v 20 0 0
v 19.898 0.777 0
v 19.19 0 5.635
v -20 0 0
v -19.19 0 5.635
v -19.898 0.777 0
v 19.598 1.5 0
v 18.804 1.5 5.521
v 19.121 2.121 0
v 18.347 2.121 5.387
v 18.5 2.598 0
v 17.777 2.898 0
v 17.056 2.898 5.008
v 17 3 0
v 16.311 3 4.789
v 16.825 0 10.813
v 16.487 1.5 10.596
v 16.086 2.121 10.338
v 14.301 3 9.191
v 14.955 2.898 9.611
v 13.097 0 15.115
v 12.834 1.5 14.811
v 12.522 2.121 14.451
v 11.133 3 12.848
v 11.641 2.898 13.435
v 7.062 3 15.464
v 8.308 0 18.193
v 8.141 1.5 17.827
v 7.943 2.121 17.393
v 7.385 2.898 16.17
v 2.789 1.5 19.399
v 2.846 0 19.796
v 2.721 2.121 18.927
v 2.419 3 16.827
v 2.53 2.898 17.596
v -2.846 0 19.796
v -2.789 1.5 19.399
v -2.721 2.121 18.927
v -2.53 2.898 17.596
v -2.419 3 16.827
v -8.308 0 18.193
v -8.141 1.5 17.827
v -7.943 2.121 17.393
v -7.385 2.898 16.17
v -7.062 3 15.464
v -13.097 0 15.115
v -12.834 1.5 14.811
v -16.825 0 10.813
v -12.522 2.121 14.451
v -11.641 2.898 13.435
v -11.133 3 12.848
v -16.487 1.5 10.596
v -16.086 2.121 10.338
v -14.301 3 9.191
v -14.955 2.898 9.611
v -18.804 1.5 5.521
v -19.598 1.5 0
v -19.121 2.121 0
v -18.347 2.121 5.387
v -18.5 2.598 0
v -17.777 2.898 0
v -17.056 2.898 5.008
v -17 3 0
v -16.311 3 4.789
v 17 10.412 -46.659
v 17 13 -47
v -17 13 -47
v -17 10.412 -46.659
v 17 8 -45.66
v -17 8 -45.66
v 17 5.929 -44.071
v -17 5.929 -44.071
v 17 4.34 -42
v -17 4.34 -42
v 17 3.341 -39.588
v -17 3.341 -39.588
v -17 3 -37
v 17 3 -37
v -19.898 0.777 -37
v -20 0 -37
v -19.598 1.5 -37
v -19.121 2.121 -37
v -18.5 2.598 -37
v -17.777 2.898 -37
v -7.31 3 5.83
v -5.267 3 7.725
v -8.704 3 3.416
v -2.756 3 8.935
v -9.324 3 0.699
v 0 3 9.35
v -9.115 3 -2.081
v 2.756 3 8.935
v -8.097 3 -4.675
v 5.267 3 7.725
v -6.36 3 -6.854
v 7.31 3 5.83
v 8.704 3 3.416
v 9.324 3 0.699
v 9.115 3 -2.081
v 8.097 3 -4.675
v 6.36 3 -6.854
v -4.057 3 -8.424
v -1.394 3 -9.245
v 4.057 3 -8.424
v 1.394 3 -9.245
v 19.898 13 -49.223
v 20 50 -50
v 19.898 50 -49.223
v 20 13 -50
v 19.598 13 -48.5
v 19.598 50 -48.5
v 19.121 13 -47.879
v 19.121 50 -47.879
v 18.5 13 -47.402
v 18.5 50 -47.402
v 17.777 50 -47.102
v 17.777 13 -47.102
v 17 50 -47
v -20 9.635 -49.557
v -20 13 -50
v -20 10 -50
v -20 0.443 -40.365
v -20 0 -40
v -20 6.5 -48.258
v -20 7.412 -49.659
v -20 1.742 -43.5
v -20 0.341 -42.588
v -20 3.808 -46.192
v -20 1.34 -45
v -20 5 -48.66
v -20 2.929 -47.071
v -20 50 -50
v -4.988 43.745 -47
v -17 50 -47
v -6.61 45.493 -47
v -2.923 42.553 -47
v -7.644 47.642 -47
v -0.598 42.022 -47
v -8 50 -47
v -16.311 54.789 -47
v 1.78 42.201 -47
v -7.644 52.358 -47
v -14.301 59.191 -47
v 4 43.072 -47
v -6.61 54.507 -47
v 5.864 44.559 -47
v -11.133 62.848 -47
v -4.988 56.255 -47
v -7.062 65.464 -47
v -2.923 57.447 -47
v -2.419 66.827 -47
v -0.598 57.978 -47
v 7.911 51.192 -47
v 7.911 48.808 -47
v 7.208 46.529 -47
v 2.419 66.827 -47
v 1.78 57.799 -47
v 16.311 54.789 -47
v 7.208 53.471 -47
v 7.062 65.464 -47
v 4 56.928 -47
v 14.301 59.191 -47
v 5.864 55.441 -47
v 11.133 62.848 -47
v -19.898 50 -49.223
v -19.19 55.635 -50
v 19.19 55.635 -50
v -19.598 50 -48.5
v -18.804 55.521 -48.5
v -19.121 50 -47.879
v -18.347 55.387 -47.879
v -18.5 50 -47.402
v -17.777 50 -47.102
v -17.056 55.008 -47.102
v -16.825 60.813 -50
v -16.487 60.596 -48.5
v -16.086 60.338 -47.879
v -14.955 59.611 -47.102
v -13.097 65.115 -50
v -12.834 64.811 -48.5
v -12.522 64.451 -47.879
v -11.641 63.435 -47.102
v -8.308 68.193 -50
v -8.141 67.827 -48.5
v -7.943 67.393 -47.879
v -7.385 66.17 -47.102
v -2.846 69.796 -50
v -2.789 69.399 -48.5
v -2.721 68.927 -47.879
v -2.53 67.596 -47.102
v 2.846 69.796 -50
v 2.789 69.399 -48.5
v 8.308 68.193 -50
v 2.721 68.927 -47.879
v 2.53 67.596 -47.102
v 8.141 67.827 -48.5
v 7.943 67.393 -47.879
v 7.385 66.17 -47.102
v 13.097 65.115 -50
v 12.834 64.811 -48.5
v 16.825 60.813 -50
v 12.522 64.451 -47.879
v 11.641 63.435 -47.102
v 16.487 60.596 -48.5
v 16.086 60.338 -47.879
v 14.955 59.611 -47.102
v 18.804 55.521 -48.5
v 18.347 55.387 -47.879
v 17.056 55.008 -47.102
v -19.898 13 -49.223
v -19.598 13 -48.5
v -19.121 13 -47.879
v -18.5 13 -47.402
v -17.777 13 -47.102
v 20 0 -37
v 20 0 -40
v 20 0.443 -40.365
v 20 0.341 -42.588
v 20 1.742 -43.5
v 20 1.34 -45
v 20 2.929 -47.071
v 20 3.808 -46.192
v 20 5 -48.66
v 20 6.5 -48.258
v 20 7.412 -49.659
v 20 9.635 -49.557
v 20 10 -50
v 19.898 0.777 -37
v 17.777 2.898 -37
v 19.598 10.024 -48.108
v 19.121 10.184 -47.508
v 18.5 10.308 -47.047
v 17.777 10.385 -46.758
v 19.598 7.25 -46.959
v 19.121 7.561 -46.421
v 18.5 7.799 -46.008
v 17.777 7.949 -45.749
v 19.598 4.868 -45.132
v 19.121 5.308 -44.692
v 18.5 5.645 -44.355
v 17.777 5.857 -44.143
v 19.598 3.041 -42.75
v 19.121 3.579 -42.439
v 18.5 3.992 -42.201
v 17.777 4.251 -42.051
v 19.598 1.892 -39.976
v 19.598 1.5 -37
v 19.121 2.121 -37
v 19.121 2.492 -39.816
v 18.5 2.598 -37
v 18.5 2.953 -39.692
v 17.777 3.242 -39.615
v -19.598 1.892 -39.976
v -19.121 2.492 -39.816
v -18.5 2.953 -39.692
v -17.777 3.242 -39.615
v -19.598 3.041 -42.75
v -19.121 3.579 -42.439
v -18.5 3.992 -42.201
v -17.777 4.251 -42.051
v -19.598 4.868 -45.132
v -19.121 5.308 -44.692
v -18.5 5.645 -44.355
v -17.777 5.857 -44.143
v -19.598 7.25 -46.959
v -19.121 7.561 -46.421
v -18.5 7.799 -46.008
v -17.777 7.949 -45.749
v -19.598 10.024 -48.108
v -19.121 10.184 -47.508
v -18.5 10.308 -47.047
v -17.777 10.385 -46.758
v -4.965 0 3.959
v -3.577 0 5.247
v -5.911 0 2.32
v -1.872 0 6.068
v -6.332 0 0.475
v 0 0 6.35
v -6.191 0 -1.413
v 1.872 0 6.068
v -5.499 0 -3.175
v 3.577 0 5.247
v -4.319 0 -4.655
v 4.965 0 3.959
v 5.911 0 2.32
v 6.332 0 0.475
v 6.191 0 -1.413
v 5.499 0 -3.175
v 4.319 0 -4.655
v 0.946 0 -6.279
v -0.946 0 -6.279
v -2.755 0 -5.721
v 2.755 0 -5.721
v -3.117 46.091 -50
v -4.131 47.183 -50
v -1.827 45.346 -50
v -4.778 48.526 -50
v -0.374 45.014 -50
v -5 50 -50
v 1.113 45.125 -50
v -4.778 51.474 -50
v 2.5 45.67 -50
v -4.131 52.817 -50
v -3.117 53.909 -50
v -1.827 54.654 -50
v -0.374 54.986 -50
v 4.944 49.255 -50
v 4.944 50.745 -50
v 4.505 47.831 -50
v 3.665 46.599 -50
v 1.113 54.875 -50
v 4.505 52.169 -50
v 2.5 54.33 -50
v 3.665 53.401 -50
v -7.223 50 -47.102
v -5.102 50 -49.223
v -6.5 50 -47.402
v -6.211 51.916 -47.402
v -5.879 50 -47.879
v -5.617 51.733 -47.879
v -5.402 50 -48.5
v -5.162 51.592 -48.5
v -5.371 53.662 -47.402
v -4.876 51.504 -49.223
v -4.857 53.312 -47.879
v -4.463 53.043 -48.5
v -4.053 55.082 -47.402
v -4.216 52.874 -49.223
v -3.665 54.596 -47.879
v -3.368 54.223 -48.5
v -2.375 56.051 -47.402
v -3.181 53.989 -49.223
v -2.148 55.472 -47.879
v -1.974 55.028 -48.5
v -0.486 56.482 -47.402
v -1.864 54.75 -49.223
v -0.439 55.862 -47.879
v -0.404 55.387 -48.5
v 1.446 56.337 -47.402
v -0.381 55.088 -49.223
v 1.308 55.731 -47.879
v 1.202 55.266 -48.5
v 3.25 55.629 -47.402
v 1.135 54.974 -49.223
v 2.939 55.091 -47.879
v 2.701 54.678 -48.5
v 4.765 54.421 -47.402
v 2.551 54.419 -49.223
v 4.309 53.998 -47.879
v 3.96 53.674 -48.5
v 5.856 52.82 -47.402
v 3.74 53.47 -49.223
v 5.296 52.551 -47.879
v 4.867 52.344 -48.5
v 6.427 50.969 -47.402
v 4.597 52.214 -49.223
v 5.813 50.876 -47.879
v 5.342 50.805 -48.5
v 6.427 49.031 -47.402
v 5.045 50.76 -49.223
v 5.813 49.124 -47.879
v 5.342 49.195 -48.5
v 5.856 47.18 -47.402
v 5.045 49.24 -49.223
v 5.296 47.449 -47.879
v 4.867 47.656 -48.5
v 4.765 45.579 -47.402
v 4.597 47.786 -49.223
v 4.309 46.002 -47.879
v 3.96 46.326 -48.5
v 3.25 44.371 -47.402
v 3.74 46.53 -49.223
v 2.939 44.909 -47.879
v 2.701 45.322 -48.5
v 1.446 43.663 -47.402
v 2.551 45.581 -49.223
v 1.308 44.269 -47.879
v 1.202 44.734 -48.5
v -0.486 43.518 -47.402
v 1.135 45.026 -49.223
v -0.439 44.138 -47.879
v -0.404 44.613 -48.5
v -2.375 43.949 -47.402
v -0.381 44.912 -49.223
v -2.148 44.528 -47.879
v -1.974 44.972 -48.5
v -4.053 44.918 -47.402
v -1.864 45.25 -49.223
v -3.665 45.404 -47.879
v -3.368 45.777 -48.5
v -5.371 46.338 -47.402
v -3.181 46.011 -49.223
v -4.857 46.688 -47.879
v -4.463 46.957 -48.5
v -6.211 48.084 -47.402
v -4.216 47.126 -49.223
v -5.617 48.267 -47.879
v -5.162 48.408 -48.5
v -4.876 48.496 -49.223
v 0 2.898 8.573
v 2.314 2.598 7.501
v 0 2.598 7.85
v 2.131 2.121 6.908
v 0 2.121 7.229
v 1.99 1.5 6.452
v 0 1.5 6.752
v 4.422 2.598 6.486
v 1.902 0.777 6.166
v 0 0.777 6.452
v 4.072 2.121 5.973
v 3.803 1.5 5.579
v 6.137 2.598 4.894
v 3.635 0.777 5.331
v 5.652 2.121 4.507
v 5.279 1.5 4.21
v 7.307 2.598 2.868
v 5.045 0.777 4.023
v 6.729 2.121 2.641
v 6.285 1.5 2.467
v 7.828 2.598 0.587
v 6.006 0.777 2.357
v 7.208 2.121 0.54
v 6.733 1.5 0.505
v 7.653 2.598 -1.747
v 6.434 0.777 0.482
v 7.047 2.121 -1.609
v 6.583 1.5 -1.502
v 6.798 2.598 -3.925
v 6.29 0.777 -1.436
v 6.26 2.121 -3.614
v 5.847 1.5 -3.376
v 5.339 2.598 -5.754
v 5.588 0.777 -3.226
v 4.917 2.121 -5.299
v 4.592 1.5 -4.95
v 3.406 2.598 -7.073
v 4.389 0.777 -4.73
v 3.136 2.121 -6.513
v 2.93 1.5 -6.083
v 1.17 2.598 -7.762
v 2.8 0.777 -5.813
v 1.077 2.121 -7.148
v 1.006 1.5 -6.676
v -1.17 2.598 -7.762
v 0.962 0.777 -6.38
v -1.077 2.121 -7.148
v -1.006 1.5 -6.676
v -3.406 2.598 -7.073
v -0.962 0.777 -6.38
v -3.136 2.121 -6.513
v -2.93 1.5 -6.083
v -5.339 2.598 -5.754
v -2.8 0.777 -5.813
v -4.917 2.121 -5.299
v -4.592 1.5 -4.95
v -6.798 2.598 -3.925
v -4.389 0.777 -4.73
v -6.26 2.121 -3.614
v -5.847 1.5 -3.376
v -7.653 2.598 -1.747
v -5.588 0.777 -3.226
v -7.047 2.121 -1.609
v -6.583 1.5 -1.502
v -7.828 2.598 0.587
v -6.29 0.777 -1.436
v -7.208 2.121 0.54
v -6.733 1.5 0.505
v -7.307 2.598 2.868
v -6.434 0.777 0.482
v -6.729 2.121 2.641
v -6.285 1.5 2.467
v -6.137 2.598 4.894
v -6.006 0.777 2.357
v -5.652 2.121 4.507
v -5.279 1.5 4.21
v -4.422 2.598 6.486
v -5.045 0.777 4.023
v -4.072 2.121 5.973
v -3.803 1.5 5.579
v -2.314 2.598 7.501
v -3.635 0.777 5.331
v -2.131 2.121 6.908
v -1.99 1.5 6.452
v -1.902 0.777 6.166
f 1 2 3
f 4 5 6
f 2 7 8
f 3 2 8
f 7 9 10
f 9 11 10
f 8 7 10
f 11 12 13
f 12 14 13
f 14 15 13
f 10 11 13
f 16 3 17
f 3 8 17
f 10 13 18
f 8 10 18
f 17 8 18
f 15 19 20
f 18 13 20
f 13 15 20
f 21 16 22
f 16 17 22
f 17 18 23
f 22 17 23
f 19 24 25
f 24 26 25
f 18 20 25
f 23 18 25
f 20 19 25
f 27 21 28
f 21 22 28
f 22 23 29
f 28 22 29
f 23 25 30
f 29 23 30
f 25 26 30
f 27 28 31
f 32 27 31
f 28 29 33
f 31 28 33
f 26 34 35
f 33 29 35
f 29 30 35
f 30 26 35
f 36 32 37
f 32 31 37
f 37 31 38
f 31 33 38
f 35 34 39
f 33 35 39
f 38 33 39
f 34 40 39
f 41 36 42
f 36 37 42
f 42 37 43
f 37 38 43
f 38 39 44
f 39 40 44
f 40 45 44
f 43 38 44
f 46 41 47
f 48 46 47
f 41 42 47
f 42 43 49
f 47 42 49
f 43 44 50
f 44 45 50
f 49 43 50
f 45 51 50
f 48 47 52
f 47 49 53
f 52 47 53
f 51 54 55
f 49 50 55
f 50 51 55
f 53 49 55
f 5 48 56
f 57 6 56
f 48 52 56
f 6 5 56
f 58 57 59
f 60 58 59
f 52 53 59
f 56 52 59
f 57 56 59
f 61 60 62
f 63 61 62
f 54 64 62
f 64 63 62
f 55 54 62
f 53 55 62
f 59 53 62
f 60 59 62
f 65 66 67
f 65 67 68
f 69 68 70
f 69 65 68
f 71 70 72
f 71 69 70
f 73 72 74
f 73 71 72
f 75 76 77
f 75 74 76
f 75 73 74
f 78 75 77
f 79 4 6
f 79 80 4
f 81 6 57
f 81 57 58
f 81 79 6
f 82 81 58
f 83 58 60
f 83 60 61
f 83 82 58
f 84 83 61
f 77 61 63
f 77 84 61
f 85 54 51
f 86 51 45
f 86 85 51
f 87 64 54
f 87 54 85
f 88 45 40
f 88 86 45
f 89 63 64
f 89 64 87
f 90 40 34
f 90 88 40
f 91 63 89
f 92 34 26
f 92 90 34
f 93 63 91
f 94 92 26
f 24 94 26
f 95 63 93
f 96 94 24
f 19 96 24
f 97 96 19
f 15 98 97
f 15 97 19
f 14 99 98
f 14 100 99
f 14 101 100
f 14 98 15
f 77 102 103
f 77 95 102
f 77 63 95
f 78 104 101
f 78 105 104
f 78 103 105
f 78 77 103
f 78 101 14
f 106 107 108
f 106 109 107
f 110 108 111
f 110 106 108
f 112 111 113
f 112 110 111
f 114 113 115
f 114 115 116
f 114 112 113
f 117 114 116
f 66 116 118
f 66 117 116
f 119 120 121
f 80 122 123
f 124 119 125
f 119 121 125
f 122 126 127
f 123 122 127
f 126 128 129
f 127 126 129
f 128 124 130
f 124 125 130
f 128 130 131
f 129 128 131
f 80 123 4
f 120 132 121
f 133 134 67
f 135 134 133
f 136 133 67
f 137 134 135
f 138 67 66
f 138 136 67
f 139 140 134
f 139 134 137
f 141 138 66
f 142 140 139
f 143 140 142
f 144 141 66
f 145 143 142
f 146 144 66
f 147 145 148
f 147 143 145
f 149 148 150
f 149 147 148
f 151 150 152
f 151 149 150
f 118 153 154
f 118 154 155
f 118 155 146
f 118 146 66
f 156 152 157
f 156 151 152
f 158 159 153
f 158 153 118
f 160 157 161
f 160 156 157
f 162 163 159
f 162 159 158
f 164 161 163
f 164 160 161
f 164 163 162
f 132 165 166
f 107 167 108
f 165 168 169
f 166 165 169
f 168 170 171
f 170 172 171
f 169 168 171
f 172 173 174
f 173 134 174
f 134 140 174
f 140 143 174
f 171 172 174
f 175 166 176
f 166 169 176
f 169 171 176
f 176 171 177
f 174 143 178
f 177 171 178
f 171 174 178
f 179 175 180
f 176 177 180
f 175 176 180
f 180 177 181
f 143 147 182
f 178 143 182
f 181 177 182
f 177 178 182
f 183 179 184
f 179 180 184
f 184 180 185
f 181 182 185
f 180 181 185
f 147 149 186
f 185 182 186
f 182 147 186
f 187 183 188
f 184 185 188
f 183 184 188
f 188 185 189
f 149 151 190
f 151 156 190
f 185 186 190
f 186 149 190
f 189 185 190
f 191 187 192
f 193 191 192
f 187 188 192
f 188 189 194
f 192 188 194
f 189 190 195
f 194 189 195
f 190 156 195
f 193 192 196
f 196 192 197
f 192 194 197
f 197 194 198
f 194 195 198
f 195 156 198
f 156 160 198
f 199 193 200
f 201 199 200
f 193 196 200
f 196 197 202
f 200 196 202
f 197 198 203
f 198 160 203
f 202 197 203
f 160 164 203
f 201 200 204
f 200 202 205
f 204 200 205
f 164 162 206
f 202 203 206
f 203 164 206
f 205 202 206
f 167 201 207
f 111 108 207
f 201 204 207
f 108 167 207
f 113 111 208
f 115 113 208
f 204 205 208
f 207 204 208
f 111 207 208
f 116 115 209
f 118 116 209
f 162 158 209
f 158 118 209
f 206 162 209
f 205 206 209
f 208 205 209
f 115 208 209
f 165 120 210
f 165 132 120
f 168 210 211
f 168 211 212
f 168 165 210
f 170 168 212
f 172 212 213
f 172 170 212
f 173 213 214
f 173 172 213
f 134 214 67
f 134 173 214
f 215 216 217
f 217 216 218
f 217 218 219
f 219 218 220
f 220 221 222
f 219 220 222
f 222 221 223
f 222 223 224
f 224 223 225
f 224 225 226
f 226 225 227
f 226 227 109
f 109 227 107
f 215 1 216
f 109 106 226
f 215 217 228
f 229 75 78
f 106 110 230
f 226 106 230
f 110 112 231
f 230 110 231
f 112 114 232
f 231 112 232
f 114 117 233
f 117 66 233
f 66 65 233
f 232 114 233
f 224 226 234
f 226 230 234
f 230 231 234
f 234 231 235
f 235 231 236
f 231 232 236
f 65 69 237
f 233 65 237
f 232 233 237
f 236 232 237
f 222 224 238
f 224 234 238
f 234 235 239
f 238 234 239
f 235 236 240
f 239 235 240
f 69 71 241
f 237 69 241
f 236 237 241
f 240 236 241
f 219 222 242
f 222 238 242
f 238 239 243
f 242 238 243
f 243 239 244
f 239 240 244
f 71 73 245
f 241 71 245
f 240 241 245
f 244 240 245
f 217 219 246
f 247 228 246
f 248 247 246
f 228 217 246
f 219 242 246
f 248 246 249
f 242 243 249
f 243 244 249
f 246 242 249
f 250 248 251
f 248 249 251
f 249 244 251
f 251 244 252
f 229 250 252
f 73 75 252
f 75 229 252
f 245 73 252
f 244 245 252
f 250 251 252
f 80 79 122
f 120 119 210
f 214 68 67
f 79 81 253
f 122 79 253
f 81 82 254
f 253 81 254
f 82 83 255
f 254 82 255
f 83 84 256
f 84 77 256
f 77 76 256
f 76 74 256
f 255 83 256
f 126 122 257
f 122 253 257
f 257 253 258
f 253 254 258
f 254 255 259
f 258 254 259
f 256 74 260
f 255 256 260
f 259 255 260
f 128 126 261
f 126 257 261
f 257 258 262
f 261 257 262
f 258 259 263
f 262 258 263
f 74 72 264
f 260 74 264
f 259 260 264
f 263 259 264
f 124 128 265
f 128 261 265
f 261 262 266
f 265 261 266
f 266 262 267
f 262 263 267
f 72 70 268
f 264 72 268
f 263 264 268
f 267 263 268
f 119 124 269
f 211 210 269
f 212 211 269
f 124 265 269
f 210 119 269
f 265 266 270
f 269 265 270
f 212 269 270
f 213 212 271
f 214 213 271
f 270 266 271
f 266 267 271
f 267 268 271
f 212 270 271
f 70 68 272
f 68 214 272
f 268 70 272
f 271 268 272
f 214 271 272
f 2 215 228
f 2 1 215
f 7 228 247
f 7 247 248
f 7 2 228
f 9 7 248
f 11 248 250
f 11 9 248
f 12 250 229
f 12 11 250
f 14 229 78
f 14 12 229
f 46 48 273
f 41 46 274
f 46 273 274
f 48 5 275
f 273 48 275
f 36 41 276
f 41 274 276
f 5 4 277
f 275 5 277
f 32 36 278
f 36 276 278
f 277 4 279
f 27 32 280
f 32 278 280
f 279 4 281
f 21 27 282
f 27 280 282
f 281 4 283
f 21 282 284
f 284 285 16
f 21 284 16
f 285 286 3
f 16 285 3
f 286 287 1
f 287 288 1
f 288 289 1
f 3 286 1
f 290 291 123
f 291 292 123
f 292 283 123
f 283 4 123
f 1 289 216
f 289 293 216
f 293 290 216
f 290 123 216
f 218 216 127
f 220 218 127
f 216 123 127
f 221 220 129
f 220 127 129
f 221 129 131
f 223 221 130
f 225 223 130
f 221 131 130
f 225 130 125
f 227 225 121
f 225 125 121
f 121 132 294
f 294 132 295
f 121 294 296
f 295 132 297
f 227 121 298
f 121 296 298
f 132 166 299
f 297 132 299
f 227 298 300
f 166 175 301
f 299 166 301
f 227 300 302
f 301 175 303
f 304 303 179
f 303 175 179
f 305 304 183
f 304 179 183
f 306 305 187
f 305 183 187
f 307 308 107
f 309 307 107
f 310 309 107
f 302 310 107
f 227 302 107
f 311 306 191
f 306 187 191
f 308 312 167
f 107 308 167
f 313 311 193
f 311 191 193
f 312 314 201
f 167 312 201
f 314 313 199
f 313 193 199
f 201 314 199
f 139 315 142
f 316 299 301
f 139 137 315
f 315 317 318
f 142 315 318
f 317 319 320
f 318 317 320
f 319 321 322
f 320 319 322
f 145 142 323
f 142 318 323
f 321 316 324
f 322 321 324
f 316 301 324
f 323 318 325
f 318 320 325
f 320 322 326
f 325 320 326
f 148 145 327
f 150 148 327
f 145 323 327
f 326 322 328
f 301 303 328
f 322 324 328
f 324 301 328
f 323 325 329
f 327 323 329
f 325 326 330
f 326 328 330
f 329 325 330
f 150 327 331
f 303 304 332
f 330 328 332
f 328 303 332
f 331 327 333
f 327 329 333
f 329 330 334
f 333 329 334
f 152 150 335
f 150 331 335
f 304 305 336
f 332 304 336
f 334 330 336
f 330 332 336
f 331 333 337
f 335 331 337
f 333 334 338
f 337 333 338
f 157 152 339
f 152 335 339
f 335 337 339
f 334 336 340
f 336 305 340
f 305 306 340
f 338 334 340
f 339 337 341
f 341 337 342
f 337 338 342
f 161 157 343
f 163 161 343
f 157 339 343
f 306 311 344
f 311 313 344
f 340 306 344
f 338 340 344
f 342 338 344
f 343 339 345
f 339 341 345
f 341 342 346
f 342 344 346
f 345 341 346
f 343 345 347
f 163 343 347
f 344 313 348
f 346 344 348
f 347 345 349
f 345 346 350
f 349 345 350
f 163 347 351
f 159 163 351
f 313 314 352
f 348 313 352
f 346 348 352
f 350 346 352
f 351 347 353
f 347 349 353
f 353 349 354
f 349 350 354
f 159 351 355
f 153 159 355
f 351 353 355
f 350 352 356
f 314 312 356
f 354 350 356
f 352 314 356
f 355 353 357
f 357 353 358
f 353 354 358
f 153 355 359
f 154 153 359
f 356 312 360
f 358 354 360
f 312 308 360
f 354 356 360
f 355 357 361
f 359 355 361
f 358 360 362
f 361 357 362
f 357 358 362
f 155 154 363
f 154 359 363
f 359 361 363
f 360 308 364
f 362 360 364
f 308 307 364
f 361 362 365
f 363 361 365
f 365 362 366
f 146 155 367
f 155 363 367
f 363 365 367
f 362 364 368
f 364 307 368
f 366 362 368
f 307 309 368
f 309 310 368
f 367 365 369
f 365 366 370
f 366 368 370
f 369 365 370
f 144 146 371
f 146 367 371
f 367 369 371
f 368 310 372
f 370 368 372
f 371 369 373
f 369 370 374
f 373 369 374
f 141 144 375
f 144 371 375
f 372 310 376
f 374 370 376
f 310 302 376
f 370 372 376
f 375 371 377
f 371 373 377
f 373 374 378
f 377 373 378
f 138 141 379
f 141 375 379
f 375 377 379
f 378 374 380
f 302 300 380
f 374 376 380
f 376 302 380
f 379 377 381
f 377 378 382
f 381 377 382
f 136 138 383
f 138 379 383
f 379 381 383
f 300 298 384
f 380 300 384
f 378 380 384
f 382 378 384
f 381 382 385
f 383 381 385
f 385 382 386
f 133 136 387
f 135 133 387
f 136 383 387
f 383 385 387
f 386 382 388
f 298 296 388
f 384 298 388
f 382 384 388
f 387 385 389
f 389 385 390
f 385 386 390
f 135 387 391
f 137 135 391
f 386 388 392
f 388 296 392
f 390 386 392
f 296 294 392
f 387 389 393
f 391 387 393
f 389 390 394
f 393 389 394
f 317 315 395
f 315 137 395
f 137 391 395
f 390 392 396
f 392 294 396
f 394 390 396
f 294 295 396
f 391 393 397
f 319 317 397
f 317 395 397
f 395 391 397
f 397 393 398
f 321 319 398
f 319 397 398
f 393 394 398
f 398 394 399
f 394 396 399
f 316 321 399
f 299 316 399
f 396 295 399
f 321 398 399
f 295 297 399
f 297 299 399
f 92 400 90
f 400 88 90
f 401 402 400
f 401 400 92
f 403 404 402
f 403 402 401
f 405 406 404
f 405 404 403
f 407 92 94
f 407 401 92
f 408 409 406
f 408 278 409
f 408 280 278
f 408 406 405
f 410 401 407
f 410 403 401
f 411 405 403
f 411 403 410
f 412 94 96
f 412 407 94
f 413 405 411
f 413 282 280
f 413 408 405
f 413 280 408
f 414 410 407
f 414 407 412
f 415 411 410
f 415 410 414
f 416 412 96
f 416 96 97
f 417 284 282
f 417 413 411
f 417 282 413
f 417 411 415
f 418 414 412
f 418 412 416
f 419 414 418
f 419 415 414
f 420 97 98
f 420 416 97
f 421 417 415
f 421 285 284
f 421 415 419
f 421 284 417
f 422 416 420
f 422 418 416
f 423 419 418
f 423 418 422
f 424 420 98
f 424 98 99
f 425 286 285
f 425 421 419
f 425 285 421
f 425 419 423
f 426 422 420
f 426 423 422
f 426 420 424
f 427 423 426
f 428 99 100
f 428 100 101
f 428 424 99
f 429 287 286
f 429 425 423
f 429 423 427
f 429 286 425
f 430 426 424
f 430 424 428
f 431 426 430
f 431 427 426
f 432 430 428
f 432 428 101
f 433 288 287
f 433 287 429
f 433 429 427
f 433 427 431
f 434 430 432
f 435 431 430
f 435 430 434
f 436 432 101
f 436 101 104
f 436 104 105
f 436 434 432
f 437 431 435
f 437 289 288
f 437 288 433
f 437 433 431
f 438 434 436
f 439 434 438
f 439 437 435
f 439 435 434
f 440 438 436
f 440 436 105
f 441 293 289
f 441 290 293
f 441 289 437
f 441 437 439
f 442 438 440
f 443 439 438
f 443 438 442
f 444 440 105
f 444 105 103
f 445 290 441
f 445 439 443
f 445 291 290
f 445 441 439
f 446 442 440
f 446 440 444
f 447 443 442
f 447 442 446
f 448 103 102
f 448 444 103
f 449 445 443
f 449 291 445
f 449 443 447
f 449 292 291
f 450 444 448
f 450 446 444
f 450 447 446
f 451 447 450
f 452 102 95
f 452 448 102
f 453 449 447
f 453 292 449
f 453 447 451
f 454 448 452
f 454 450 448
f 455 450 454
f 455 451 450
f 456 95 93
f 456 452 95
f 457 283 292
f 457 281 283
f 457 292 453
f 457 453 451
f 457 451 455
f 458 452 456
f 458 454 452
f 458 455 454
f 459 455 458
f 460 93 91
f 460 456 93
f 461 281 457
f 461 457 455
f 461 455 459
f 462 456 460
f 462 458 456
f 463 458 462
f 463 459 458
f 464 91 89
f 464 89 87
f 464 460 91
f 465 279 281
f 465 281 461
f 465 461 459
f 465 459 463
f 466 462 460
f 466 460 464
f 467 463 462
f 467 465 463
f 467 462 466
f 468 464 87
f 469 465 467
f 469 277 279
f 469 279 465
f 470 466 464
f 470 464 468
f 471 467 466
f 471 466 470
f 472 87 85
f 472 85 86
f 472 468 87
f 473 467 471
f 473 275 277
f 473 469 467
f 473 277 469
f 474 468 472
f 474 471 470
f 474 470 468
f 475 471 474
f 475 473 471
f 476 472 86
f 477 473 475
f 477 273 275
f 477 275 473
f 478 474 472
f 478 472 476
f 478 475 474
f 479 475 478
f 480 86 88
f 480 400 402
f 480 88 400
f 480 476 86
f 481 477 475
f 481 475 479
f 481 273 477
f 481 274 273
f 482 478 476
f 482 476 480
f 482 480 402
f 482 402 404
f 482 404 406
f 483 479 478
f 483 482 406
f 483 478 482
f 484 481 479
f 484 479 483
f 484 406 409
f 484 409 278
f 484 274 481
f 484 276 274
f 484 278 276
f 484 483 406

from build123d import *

# Parameters (mm, degrees)
SKETCH1_R           = 20
SKETCH1_R_2         = 6.35
BOSS_EXTRUDE1_DEPTH = 3
SKETCH2_R           = 5
BOSS_EXTRUDE2_DEPTH = 3
FILLET1_R           = 10
FILLET2_R           = 10
FILLET3_R           = 3
FILLET4_R           = 3


with BuildPart() as part:
    # Sketch1 → Boss-Extrude1 (new body)
    # profile 1 of 2: a face of its own
    with BuildSketch(Plane(origin=(0, 0, 0), x_dir=(1, 0, 0), z_dir=(0, 1, 0))):
        with BuildLine():
            Line((-20, 50), (-20, 0))
            ThreePointArc((-20, 0), (0, 20), (20, 0))
            Line((20, 0), (20, 50))
            Line((20, 50), (-20, 50))
        make_face()
    # profile 2 of 2: a face of its own
    with BuildSketch(Plane(origin=(0, 0, 0), x_dir=(1, 0, 0), z_dir=(0, 1, 0))):
        Circle(SKETCH1_R)
        with Locations(Location((0, 0, 0), (0, 0, 270))):
            Circle(SKETCH1_R_2, mode=Mode.SUBTRACT)
    extrude(amount=BOSS_EXTRUDE1_DEPTH)

    # Sketch2 → Boss-Extrude2 (add)
    with BuildSketch(Plane(origin=(0, 0, -50), x_dir=(-1, 0, 0), z_dir=(0, 0, -1))):
        with BuildLine():
            Line((-20, 3), (-20, 50))
            ThreePointArc((-20, 50), (0, 70), (20, 50))
            Line((20, 50), (20, 3))
            Line((20, 3), (20, 0))
            Line((20, 0), (-20, 0))
            Line((-20, 0), (-20, 3))
        make_face()
        with Locations((0, 50)):
            Circle(SKETCH2_R, mode=Mode.SUBTRACT)
    extrude(amount=-BOSS_EXTRUDE2_DEPTH)

    # Fillet1
    fillet1_edges = [part.edges().sort_by_distance(p)[0] for p in [
        (0, 3, -47),
    ]]
    fillet(fillet1_edges, radius=FILLET1_R)

    # Fillet2
    fillet2_edges = [part.edges().sort_by_distance(p)[0] for p in [
        (0, 0, -50),
    ]]
    fillet(fillet2_edges, radius=FILLET2_R)

    # Fillet3
    fillet3_edges = [part.edges().sort_by_distance(p)[0] for p in [
        (20, 5.928932188, -44.071067812),
        (20, 31.5, -47),
        (0, 70, -47),
        (-20, 31.5, -47),
        (-20, 5.928932188, -44.071067812),
        (0, 3, -6.35),
        (0, 3, 20),
        (-20, 3, -18.5),
        (20, 3, -18.5),
    ]]
    fillet(fillet3_edges, radius=FILLET3_R - 0.0001)  # a hair under: the kernel refuses the full size

    # Fillet4
    fillet4_edges = [part.edges().sort_by_distance(p)[0] for p in [
        (5, 50, -47),
    ]]
    fillet(fillet4_edges, radius=FILLET4_R - 0.0001)  # a hair under: the kernel refuses the full size


solid = part.part
